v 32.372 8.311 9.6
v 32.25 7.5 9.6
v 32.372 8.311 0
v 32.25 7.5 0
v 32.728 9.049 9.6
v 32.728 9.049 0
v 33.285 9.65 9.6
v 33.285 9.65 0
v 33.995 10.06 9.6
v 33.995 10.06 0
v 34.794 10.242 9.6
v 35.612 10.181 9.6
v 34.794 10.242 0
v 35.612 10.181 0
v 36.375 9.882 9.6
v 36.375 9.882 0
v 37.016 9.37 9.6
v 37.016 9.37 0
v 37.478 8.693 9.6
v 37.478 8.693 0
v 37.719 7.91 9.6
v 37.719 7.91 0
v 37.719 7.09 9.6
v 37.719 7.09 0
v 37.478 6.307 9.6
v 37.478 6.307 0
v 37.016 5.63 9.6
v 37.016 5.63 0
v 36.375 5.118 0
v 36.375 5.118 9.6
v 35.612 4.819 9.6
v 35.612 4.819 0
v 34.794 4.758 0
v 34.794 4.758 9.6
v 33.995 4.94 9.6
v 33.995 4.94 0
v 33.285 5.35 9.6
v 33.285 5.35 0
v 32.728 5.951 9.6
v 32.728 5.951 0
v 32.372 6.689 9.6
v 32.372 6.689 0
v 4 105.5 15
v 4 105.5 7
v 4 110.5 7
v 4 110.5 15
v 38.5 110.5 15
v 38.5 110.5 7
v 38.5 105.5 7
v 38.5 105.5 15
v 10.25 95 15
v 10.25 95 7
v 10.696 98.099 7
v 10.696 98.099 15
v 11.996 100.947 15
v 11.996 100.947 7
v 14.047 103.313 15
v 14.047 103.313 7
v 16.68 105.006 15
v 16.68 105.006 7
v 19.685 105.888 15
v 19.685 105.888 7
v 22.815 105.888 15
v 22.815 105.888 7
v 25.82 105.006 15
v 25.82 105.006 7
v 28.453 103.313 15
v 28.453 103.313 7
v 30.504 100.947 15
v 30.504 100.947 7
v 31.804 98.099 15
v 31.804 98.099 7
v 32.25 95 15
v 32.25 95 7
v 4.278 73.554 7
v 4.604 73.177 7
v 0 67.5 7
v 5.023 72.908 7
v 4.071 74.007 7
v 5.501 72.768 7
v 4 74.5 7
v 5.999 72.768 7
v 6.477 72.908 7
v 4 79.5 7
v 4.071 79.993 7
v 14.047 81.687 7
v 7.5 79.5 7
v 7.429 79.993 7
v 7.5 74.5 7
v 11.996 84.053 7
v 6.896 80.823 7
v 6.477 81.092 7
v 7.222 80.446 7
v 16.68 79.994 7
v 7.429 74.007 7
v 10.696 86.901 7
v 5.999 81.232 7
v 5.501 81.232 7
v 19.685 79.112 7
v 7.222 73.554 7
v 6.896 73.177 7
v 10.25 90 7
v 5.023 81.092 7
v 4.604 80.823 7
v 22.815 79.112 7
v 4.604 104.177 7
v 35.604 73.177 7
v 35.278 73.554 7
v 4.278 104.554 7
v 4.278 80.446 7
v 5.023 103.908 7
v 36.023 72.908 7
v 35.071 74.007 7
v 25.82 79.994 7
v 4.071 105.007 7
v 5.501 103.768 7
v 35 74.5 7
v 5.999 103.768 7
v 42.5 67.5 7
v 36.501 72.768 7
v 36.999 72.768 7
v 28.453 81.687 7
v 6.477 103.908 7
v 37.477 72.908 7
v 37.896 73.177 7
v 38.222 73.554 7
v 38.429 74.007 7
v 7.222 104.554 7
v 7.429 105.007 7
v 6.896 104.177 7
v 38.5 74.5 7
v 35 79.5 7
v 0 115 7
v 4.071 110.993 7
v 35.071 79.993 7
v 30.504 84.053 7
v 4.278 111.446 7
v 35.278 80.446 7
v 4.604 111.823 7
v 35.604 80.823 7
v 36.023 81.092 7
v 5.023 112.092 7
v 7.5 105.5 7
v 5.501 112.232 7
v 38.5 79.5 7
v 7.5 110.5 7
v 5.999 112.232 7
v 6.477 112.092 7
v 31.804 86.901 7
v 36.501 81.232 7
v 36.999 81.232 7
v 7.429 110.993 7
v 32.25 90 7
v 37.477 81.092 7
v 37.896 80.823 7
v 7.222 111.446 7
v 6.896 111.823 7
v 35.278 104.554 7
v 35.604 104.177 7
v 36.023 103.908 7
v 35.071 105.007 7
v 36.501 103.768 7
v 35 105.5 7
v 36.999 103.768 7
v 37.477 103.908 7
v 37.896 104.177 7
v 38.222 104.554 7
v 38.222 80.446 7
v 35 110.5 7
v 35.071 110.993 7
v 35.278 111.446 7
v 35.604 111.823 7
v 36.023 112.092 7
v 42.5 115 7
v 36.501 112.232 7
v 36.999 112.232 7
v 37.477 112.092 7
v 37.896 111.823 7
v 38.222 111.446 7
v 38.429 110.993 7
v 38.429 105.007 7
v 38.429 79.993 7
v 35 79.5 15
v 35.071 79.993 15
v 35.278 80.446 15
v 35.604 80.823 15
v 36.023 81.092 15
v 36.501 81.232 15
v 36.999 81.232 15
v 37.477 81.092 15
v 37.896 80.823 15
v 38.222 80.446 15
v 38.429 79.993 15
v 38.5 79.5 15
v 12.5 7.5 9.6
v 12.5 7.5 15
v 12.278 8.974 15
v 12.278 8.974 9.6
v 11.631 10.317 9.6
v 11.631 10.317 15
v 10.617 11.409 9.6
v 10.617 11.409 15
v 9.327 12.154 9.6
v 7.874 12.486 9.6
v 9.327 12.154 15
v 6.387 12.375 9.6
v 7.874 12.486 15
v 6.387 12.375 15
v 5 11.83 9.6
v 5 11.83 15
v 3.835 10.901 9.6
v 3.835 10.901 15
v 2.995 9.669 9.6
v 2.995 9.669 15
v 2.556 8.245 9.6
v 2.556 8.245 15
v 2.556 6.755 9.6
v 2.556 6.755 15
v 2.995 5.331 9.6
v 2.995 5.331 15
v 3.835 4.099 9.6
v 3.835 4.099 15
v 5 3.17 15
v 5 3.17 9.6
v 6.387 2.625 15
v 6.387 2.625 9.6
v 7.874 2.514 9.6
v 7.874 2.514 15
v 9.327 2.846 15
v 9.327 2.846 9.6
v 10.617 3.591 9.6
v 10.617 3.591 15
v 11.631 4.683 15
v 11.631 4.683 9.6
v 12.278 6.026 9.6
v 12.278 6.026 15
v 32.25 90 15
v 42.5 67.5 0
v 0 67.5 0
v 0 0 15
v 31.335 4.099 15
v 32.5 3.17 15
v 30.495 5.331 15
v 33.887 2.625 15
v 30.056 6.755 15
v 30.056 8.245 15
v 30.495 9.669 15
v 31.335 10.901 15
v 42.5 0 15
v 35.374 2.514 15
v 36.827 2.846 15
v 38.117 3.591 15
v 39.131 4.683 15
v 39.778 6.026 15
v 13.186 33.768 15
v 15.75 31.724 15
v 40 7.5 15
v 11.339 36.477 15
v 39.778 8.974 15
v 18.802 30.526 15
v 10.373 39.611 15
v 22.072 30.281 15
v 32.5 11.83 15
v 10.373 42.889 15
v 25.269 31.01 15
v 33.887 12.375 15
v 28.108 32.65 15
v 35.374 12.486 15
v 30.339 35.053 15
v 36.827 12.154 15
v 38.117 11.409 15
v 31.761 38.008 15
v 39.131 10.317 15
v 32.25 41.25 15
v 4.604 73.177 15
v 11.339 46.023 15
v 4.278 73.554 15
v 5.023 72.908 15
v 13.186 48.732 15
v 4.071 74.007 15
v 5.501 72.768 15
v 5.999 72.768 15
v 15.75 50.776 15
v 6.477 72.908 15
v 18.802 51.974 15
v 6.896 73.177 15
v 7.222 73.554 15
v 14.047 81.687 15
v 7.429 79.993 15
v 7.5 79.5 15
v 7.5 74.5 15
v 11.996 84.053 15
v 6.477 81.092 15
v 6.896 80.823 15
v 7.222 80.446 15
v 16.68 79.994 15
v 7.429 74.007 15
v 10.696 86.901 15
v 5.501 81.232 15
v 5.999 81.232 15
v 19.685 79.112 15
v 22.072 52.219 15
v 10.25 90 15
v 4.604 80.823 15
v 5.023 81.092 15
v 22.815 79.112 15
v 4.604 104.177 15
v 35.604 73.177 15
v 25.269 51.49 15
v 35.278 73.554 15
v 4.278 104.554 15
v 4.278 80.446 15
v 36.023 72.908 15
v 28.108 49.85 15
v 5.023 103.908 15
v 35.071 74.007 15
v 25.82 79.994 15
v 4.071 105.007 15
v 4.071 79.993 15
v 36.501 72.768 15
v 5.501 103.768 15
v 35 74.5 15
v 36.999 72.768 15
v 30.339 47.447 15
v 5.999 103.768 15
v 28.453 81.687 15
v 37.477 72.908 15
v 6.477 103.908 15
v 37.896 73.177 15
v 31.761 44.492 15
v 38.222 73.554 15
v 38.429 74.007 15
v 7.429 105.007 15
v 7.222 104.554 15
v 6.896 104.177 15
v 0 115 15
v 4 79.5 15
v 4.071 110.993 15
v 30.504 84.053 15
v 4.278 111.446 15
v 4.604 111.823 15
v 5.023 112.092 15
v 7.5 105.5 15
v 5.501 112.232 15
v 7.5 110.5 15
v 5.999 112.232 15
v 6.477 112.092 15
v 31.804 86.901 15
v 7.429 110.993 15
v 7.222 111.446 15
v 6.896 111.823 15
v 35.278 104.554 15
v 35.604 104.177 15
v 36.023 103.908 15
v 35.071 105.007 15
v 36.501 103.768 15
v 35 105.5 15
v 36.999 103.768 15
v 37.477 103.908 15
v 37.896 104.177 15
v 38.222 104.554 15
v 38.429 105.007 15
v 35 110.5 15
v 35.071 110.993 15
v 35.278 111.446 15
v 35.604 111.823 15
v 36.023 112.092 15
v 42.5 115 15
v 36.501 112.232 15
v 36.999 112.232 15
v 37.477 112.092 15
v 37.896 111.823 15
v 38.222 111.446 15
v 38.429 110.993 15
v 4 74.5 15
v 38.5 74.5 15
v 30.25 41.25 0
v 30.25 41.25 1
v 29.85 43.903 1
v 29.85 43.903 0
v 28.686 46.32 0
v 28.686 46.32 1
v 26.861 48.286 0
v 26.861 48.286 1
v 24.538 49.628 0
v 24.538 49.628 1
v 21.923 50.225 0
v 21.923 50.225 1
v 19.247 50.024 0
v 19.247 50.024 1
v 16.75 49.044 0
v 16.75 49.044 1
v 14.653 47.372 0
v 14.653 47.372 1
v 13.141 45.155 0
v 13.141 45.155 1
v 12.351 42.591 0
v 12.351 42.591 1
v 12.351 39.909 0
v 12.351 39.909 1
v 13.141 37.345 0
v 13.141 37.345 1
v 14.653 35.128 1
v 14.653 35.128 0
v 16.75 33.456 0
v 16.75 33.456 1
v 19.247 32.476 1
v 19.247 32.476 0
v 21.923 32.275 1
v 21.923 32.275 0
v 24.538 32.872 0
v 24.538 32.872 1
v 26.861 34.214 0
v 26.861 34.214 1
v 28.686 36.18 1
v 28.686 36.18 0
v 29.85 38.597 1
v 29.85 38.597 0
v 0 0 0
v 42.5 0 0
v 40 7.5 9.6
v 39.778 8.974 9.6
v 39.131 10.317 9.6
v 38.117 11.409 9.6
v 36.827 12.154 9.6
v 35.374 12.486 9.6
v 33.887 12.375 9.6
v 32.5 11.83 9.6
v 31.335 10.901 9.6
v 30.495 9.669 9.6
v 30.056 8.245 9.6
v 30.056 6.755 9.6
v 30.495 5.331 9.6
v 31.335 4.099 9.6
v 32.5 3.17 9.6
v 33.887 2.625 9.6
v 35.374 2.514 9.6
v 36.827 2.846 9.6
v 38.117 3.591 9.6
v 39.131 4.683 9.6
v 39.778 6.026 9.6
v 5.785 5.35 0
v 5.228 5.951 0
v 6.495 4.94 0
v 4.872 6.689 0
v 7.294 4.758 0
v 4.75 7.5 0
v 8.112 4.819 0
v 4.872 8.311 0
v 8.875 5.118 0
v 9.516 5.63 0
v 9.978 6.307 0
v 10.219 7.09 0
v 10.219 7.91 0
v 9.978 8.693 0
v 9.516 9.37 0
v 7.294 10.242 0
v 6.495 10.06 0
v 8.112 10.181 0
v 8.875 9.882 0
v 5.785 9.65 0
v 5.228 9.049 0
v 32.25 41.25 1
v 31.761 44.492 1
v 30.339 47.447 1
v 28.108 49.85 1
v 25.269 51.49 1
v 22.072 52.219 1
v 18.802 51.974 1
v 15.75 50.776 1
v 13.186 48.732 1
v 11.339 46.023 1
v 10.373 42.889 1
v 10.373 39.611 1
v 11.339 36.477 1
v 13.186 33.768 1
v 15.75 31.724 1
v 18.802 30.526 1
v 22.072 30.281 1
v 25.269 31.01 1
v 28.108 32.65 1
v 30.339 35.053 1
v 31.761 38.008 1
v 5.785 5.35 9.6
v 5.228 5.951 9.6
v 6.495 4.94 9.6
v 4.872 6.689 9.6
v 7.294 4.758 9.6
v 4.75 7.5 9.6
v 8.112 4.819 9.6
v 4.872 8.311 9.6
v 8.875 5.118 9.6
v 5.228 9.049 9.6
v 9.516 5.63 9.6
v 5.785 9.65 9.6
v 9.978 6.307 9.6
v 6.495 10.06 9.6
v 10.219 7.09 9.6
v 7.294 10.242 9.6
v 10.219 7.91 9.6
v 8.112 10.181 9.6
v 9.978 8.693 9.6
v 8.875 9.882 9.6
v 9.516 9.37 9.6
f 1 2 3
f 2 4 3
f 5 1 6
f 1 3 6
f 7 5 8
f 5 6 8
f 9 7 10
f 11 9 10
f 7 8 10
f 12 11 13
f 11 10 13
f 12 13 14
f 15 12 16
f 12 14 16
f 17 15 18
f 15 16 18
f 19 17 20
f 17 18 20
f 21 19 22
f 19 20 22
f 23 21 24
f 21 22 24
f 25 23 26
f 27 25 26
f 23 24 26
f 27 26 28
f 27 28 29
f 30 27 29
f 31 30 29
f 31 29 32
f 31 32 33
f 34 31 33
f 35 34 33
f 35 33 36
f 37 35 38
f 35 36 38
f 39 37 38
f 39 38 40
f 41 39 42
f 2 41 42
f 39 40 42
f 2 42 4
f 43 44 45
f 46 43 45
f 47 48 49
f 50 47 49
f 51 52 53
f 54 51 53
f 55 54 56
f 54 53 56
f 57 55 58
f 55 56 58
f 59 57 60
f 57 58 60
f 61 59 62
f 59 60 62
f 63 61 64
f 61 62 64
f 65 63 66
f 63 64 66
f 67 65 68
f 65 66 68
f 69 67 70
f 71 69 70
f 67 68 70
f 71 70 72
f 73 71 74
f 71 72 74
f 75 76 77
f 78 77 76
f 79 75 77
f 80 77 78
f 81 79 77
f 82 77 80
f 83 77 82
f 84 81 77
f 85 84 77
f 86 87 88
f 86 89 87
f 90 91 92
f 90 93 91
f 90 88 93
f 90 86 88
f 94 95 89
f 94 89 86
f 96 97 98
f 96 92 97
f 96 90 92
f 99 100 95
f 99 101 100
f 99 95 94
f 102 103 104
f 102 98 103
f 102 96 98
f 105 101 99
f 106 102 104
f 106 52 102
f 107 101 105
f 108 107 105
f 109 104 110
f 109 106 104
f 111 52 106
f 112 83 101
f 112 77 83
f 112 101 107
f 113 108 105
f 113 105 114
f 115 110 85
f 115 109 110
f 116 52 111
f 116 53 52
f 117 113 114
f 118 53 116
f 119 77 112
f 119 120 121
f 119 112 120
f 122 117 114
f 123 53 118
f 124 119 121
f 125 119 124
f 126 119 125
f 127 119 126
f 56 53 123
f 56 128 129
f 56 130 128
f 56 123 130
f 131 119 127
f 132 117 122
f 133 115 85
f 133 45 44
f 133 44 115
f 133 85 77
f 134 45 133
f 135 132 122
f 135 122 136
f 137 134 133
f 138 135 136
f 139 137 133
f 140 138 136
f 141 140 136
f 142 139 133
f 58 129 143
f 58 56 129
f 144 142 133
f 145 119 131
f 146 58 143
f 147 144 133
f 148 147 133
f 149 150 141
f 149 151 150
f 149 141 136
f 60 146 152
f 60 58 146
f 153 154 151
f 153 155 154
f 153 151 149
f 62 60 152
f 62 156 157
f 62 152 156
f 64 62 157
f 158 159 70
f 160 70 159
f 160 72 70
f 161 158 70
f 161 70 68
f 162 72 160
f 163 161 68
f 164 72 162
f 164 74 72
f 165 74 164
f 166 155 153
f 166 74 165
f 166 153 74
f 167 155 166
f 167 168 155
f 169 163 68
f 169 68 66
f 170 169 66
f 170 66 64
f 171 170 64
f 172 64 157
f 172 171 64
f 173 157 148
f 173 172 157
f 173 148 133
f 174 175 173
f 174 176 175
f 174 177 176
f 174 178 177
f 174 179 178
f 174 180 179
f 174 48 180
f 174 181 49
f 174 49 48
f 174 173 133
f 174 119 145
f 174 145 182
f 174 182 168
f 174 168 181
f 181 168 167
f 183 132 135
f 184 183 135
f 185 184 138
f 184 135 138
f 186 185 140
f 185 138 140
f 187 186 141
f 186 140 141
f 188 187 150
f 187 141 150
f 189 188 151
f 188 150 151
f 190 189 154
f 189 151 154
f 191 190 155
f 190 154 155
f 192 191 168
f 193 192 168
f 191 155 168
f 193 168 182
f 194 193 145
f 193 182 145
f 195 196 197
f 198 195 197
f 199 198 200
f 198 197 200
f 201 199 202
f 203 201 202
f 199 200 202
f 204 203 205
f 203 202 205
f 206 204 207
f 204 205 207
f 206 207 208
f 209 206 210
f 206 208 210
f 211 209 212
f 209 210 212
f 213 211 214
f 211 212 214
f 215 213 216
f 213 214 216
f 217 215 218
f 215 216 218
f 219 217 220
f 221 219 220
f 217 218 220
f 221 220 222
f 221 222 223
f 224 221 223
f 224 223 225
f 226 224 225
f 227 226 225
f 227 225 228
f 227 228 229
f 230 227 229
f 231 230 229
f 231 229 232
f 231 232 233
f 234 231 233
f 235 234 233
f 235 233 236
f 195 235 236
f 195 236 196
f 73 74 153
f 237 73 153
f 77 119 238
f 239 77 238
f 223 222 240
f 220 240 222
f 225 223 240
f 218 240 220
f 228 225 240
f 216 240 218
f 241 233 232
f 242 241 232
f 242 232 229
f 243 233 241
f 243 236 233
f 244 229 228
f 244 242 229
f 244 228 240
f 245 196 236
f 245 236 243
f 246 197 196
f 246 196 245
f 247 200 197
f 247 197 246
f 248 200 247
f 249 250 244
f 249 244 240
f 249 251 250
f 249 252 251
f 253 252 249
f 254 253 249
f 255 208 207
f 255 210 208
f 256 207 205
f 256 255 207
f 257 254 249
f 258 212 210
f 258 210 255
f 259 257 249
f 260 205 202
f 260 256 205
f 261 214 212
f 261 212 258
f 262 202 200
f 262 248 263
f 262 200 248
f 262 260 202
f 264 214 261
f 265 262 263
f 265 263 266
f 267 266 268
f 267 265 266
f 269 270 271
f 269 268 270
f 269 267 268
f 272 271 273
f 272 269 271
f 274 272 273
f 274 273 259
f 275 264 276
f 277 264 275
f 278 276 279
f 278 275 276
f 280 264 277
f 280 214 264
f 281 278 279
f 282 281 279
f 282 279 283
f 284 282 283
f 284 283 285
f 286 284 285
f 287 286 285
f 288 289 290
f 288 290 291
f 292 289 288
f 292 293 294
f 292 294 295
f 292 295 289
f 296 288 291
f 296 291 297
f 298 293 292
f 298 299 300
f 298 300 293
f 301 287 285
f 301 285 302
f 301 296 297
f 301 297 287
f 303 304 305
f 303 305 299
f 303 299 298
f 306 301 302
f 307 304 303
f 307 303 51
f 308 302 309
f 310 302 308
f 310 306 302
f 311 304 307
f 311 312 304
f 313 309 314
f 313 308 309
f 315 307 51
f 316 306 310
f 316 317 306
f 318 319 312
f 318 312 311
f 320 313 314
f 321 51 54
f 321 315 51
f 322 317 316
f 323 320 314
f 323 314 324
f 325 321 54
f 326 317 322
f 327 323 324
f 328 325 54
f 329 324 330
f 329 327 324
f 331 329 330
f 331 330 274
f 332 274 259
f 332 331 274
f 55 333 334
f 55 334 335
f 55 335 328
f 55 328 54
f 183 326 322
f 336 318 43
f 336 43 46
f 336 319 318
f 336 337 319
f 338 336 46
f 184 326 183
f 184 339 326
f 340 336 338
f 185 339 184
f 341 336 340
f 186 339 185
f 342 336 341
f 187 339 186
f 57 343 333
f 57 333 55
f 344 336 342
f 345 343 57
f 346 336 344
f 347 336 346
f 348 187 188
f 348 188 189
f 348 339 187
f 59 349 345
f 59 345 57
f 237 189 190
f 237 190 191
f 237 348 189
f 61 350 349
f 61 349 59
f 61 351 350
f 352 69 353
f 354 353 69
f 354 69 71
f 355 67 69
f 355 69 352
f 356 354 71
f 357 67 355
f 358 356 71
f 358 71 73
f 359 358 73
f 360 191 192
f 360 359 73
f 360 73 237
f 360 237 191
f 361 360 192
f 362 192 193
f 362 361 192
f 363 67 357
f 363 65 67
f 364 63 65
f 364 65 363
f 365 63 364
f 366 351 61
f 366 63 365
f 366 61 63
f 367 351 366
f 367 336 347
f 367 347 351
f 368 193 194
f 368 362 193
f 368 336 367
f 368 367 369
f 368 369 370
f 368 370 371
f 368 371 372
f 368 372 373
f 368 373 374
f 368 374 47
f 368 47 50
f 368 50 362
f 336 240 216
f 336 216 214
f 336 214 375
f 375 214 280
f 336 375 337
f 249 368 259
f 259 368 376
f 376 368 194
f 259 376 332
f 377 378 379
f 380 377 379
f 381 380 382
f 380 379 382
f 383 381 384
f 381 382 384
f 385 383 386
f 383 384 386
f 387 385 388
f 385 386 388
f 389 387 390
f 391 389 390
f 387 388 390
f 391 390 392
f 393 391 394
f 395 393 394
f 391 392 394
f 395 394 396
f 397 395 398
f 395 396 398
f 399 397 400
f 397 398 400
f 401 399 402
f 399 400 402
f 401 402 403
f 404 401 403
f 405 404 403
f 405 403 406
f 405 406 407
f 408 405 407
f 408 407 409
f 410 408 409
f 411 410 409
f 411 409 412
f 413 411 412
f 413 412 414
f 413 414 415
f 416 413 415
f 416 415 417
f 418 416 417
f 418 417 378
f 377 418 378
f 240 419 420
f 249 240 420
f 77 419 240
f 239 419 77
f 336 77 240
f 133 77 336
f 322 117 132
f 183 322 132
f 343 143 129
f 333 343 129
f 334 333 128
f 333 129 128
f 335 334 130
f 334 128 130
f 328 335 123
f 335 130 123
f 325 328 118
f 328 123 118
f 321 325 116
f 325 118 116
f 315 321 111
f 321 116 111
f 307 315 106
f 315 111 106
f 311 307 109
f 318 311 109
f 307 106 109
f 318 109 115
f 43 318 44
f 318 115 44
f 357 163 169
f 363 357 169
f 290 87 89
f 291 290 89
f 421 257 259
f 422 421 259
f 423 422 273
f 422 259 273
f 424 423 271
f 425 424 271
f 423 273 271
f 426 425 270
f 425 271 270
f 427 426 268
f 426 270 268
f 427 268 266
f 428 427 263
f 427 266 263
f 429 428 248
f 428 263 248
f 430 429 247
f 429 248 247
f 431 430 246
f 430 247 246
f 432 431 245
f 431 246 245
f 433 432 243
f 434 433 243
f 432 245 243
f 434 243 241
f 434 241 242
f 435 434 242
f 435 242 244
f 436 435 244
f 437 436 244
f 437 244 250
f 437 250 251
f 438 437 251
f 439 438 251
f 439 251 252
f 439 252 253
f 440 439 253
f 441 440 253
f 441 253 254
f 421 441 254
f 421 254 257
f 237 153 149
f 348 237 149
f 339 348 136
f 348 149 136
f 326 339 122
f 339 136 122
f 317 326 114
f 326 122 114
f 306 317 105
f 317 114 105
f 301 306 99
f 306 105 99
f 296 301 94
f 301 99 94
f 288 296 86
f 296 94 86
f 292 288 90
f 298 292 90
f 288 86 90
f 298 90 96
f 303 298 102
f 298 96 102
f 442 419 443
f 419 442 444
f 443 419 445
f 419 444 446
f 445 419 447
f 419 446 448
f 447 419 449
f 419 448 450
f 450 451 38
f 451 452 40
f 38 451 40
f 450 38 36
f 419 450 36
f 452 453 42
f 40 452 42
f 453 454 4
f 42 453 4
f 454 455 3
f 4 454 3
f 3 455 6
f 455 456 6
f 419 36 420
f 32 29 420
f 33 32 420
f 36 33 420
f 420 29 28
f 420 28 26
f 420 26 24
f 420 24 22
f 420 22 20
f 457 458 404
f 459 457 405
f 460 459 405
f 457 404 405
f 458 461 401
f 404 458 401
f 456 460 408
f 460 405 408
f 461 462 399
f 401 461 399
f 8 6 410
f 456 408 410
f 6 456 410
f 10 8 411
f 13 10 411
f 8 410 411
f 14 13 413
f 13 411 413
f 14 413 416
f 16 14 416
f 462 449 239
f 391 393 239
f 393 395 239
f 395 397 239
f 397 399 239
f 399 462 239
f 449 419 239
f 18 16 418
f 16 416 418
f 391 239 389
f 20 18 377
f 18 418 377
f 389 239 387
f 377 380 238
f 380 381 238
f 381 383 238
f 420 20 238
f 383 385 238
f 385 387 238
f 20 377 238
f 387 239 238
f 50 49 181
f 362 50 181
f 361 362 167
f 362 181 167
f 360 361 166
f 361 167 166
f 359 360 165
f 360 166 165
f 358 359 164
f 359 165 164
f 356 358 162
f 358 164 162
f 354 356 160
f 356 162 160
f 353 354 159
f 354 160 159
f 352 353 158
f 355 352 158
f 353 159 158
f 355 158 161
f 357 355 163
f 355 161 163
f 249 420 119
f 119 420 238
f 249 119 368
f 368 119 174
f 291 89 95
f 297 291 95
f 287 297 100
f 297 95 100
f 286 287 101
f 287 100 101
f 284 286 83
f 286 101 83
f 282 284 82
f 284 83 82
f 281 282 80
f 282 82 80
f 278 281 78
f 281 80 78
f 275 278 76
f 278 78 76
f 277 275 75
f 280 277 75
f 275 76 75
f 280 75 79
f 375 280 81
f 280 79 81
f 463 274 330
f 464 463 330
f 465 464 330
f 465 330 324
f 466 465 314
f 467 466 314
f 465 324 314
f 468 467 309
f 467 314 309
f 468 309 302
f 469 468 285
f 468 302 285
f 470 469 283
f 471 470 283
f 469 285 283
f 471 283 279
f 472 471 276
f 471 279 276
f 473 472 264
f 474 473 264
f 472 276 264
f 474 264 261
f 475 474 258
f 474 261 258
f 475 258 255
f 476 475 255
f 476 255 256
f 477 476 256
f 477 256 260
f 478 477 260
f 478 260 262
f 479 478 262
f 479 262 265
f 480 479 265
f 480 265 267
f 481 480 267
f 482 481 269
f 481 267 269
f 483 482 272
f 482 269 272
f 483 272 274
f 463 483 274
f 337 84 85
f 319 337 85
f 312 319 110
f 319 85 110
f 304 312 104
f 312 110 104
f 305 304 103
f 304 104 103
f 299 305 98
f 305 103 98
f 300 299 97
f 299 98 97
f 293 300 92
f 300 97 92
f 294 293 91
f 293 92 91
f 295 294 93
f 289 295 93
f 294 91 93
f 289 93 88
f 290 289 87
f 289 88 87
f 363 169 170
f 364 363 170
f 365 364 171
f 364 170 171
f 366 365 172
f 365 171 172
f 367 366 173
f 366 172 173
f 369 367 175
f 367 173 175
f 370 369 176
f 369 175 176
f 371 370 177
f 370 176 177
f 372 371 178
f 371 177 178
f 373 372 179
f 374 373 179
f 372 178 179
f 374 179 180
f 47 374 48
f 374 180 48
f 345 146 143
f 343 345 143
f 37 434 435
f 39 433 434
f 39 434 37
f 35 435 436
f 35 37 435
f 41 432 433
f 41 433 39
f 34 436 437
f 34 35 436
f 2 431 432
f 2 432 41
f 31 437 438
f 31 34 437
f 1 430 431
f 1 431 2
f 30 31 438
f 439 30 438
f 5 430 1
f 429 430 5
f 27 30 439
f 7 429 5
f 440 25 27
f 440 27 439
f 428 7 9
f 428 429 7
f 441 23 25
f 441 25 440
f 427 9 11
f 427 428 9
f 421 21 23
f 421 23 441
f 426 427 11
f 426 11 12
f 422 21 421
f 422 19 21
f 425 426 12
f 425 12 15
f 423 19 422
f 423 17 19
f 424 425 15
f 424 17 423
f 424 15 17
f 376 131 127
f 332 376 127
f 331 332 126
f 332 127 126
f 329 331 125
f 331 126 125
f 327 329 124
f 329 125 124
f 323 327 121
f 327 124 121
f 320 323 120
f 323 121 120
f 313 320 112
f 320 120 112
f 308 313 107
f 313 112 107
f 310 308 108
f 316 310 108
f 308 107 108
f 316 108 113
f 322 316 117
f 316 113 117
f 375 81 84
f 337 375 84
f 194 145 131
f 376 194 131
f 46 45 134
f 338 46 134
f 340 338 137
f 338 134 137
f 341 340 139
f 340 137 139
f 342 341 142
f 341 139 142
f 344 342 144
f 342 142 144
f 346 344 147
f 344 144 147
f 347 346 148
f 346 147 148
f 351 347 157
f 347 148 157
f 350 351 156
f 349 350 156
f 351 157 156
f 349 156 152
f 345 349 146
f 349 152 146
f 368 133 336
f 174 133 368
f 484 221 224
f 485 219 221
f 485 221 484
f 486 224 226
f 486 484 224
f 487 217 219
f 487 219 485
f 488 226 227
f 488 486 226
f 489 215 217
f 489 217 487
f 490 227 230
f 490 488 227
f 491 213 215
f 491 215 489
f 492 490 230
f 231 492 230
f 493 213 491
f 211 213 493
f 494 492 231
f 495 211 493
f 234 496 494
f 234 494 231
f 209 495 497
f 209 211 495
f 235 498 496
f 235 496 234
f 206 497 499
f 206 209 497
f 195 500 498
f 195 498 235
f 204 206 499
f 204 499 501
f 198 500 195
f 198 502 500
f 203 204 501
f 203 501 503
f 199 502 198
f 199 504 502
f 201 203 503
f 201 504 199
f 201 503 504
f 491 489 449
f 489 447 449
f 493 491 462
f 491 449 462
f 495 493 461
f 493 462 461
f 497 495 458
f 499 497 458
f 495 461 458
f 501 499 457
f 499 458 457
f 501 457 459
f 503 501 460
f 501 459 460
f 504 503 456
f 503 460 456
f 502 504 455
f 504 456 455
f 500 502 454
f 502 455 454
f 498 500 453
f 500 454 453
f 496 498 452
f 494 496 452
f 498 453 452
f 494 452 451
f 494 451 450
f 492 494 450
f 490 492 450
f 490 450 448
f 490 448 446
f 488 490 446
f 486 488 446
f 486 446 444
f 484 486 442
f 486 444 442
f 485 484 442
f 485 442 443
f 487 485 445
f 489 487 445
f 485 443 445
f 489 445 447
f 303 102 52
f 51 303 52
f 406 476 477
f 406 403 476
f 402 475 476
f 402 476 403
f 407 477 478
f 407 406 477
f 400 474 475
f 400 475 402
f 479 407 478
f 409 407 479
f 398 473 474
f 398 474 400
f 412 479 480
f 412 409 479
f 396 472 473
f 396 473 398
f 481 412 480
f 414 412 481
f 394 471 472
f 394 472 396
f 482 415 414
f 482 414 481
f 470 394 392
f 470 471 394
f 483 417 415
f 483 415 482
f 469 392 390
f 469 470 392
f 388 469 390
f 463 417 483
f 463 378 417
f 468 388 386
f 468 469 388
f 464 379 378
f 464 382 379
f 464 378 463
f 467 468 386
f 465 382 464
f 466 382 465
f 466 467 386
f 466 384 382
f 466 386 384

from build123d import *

# Parameters (mm, degrees)
SKIZZE1_W                                            = 42.5
SKIZZE1_H                                            = 115
AUFSATZ_LINEAR_AUSTRAGEN1_DEPTH                      = 15
SKIZZE2_R                                            = 11
SCHNITT_LINEAR_AUSTRAGEN1_DEPTH                      = 14
SKIZZE3_R                                            = 9
SCHNITT_LINEAR_AUSTRAGEN2_DEPTH                      = 14
STIRNSENKUNG_F_R_M5_ZYLINDERSCHRAUBE_MIT_D           = 5.5
STIRNSENKUNG_F_R_M5_ZYLINDERSCHRAUBE_MIT_CBORE_D     = 10
STIRNSENKUNG_F_R_M5_ZYLINDERSCHRAUBE_MIT_CBORE_DEPTH = 5.4
SKIZZE6_W                                            = 7
SKIZZE6_H                                            = 47.5
SCHNITT_LINEAR_AUSTRAGEN3_DEPTH                      = 50


with BuildPart() as part:
    # Skizze1 → Aufsatz-Linear austragen1 (new body)
    with BuildSketch(Plane.XY):
        with Locations((21.25, 57.5)):
            Rectangle(SKIZZE1_W, SKIZZE1_H)
        with BuildLine():
            Line((32.25, 95), (32.25, 90))
            ThreePointArc((32.25, 90), (21.25, 79), (10.25, 90))
            Line((10.25, 90), (10.25, 95))
            ThreePointArc((10.25, 95), (21.25, 106), (32.25, 95))
        make_face(mode=Mode.SUBTRACT)
        with BuildLine():
            Line((7.5, 110.5), (7.5, 105.5))
            ThreePointArc((7.5, 105.5), (5.75, 103.75), (4, 105.5))
            Line((4, 105.5), (4, 110.5))
            ThreePointArc((4, 110.5), (5.75, 112.25), (7.5, 110.5))
        make_face(mode=Mode.SUBTRACT)
        with BuildLine():
            Line((38.5, 110.5), (38.5, 105.5))
            ThreePointArc((38.5, 105.5), (36.75, 103.75), (35, 105.5))
            Line((35, 105.5), (35, 110.5))
            ThreePointArc((35, 110.5), (36.75, 112.25), (38.5, 110.5))
        make_face(mode=Mode.SUBTRACT)
        with BuildLine():
            Line((38.5, 79.5), (38.5, 74.5))
            ThreePointArc((38.5, 74.5), (36.75, 72.75), (35, 74.5))
            Line((35, 74.5), (35, 79.5))
            ThreePointArc((35, 79.5), (36.75, 81.25), (38.5, 79.5))
        make_face(mode=Mode.SUBTRACT)
        with BuildLine():
            Line((7.5, 79.5), (7.5, 74.5))
            ThreePointArc((7.5, 74.5), (5.75, 72.75), (4, 74.5))
            Line((4, 74.5), (4, 79.5))
            ThreePointArc((4, 79.5), (5.75, 81.25), (7.5, 79.5))
        make_face(mode=Mode.SUBTRACT)
    extrude(amount=AUFSATZ_LINEAR_AUSTRAGEN1_DEPTH)

    # Skizze2 → Schnitt-Linear austragen1 (cut)
    with BuildSketch(Plane.XY.offset(15)):
        with Locations((21.25, 41.25)):
            Circle(SKIZZE2_R)
    extrude(amount=-SCHNITT_LINEAR_AUSTRAGEN1_DEPTH, mode=Mode.SUBTRACT)

    # Skizze3 → Schnitt-Linear austragen2 (cut)
    with BuildSketch(Plane.XY.offset(1)):
        with Locations((21.25, 41.25)):
            Circle(SKIZZE3_R)
    extrude(amount=-SCHNITT_LINEAR_AUSTRAGEN2_DEPTH, mode=Mode.SUBTRACT)

    # Stirnsenkung für M5 Zylinderschraube mit Innensechskant1 (through all)
    with Locations(Plane(origin=(35, 7.5, 15), x_dir=(1, 0, 0), z_dir=(0, 0, 1))):
        with Locations((0, 0), (-27.5, 0)):
            CounterBoreHole(STIRNSENKUNG_F_R_M5_ZYLINDERSCHRAUBE_MIT_D / 2, STIRNSENKUNG_F_R_M5_ZYLINDERSCHRAUBE_MIT_CBORE_D / 2, STIRNSENKUNG_F_R_M5_ZYLINDERSCHRAUBE_MIT_CBORE_DEPTH)

    # Skizze6 → Schnitt-Linear austragen3 (cut)
    with BuildSketch(Plane(origin=(42.5, 0, 0), x_dir=(0, 0, -1), z_dir=(1, 0, 0))):
        with Locations((-3.5, 91.25)):
            Rectangle(SKIZZE6_W, SKIZZE6_H)
    extrude(amount=-SCHNITT_LINEAR_AUSTRAGEN3_DEPTH, mode=Mode.SUBTRACT)


solid = part.part
